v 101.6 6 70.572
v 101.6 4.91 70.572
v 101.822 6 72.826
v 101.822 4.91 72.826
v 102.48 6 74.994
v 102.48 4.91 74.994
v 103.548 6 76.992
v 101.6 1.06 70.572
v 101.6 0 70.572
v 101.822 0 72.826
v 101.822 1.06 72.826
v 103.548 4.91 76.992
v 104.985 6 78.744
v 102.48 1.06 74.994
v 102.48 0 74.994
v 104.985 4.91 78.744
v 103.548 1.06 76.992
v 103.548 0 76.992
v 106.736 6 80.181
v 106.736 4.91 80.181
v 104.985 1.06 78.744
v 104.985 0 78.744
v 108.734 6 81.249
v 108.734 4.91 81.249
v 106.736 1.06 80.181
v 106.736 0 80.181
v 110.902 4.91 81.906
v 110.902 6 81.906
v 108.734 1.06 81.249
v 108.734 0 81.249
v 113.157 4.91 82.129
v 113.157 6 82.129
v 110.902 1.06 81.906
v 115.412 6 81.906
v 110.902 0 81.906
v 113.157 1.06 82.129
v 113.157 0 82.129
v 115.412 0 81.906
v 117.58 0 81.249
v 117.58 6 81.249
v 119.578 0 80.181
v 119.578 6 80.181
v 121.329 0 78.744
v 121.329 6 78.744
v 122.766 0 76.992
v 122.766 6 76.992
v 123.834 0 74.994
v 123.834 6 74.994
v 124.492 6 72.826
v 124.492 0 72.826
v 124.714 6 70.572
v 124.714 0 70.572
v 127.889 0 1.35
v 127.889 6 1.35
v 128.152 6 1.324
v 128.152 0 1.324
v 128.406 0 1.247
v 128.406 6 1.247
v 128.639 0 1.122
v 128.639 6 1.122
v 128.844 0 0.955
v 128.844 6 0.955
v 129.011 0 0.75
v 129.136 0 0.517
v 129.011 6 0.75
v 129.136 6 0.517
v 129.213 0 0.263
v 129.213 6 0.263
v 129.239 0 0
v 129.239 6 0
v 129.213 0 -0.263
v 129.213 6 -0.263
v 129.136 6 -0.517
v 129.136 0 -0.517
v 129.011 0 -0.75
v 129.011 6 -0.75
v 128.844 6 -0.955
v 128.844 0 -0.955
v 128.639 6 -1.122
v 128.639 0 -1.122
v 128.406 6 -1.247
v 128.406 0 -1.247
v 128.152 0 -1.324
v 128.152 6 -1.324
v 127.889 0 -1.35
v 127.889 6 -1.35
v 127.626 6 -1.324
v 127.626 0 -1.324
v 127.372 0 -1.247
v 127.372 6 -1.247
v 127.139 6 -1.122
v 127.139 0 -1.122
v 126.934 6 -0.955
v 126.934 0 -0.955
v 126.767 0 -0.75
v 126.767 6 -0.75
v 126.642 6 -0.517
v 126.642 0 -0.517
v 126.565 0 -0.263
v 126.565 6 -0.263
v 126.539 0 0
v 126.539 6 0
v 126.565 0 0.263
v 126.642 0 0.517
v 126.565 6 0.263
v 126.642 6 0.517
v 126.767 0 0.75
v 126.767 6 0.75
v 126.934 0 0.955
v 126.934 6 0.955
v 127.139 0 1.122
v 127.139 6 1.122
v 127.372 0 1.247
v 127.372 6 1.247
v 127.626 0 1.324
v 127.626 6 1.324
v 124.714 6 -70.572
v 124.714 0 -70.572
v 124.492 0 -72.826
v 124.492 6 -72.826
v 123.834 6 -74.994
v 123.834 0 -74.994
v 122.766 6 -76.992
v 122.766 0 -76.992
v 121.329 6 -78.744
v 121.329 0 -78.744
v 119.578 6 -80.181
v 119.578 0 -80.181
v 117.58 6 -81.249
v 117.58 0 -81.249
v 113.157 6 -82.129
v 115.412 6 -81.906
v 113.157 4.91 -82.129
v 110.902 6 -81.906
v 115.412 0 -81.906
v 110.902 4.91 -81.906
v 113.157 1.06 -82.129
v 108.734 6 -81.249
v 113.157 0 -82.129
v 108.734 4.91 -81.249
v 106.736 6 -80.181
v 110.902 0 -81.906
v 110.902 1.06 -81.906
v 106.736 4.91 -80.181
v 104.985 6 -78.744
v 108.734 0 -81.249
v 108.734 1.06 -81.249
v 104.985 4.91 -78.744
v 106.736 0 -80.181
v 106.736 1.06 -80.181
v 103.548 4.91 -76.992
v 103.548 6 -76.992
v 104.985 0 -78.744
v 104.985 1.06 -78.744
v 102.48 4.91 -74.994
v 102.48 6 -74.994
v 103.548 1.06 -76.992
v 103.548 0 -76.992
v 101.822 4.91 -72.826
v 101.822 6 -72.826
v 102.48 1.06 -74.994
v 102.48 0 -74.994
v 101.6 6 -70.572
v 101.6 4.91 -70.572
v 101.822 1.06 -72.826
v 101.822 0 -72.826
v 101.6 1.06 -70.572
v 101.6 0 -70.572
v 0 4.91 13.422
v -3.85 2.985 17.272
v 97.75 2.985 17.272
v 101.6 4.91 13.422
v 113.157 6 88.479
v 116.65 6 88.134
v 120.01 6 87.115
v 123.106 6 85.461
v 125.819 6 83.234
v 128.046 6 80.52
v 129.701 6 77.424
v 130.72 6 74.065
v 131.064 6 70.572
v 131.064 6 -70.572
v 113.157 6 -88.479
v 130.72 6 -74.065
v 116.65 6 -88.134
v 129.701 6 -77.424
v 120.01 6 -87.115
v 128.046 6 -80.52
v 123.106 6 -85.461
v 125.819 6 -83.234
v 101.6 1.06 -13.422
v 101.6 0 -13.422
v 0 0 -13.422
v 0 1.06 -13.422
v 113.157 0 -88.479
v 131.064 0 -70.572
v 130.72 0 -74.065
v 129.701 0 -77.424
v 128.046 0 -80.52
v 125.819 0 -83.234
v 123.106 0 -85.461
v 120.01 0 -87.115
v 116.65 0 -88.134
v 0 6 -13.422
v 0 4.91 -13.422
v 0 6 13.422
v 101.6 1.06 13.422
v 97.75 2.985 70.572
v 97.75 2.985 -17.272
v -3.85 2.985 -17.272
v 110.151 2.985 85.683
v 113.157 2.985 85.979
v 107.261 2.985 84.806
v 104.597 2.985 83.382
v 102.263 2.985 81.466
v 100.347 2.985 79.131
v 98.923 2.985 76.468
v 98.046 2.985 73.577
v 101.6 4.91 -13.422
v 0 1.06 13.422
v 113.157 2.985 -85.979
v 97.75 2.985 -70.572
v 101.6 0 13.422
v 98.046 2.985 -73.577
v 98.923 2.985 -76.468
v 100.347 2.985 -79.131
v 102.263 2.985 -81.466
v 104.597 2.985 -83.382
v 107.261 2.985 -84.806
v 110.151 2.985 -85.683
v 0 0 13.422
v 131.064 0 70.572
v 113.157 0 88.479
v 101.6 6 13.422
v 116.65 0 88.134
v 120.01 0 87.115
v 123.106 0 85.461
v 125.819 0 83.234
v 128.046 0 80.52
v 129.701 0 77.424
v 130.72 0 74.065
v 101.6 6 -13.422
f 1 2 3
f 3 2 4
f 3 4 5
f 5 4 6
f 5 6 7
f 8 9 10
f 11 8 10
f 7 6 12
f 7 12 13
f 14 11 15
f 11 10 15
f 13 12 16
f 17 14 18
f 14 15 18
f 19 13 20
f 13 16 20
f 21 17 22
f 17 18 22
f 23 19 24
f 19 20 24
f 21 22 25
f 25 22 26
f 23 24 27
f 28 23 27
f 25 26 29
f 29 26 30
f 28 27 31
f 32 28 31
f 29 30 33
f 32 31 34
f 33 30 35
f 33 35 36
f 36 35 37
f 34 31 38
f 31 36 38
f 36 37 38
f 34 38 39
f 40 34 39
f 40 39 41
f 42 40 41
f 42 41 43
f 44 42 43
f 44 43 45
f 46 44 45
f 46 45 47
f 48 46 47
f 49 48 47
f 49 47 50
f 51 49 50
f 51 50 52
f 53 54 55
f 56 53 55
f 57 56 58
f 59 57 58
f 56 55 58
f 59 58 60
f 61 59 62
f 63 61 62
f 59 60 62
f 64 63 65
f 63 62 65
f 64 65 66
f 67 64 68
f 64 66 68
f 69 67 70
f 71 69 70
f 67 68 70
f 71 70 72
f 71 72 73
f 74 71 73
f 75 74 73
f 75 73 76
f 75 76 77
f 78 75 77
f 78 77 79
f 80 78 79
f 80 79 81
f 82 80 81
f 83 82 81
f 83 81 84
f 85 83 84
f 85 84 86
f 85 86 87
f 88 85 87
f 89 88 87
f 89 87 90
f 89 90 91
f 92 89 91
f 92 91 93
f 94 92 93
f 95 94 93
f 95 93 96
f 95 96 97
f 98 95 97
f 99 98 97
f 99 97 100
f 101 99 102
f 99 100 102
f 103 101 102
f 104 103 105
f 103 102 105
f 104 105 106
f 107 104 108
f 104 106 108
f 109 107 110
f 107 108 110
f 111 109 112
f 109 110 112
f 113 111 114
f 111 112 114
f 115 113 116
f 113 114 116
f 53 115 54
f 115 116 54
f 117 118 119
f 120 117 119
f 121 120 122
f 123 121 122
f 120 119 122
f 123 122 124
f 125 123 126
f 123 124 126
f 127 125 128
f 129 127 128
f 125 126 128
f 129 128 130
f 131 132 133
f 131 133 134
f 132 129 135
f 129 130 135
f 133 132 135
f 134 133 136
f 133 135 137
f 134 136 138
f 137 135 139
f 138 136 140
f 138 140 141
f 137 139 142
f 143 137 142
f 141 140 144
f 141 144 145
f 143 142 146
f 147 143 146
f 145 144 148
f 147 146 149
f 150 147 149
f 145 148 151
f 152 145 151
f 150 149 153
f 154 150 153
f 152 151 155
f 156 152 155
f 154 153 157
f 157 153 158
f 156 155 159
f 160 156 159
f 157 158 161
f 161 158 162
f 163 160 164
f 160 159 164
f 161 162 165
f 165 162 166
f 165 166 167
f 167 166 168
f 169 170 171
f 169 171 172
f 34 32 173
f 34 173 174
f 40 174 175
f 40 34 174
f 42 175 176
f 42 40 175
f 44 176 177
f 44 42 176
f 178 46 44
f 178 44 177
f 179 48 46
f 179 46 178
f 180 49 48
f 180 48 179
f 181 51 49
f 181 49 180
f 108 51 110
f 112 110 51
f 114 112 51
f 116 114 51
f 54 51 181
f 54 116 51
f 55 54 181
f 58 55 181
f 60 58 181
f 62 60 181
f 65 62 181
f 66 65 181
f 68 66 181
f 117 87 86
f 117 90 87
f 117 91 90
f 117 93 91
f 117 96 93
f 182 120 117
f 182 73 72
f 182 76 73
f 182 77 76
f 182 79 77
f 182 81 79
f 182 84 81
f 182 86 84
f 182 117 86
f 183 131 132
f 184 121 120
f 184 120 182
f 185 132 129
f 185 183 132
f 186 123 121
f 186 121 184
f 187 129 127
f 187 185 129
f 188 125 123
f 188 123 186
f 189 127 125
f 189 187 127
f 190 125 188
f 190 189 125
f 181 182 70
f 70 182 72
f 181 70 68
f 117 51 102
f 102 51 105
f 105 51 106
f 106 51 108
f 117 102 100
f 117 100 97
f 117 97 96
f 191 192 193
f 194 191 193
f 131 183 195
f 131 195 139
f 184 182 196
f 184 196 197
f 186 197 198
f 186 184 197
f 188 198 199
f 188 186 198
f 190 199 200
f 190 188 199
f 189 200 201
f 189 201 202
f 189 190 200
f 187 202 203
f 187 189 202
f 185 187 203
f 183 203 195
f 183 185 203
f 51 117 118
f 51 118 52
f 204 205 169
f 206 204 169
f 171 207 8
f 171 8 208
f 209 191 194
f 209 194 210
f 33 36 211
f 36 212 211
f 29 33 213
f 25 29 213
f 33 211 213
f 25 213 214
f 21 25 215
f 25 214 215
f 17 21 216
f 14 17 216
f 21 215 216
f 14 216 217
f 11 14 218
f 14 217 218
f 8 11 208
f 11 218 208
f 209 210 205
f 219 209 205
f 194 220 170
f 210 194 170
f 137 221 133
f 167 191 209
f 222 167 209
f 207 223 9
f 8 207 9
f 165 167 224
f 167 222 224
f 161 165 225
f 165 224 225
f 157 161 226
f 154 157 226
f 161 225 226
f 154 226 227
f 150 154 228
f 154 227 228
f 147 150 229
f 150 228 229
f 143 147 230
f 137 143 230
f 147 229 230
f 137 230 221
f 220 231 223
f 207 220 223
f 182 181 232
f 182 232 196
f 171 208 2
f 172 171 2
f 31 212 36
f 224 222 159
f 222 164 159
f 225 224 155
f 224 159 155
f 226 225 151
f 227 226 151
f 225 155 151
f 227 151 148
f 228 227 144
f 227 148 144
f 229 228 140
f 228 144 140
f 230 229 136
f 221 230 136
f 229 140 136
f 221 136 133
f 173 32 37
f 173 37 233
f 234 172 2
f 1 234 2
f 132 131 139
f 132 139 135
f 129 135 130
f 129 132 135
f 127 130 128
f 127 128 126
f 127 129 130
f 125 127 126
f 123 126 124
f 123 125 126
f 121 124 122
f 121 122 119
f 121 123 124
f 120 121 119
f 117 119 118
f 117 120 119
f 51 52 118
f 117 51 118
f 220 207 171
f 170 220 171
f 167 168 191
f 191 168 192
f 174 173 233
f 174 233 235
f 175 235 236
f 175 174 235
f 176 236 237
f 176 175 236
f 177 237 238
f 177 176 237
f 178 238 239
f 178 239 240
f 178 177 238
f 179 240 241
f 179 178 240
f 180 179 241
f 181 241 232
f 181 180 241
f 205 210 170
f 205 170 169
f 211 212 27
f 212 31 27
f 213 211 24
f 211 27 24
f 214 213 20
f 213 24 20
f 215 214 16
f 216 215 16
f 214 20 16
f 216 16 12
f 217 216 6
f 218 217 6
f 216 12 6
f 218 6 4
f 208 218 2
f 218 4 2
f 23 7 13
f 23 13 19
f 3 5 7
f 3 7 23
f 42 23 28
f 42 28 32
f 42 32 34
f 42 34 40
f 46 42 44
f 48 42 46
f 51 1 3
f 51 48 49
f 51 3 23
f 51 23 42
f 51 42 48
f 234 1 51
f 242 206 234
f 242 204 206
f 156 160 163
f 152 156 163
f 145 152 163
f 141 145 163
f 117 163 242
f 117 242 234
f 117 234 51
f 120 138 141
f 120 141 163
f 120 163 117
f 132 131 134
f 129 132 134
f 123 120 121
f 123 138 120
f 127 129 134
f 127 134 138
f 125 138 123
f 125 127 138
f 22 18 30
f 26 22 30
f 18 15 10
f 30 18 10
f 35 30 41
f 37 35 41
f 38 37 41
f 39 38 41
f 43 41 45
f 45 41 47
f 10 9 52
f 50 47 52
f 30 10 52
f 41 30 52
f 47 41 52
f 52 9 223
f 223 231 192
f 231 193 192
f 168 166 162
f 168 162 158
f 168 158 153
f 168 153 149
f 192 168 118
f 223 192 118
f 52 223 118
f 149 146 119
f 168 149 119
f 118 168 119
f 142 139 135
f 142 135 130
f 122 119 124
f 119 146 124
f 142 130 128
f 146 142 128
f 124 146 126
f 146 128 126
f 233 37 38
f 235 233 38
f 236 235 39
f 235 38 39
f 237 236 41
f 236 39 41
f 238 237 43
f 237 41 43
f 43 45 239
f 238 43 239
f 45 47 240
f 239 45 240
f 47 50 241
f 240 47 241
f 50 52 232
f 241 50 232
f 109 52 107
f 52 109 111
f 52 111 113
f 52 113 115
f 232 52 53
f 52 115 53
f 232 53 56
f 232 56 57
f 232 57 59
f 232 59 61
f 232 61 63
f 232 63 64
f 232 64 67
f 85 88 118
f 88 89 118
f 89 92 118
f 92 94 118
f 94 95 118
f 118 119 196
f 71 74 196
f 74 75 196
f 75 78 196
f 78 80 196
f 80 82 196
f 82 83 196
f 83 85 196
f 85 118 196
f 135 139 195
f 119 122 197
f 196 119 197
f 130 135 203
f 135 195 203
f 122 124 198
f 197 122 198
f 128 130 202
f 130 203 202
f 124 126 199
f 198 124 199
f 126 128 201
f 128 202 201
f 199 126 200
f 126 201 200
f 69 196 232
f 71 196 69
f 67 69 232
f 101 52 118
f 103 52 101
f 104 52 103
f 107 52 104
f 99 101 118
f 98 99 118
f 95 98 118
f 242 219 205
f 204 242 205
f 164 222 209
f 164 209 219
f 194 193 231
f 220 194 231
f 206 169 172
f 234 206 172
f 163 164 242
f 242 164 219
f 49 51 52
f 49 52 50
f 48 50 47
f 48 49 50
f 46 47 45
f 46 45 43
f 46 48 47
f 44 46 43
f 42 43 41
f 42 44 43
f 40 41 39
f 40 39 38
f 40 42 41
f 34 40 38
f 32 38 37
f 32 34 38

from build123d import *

# Parameters (mm, degrees)
BOSS_EXTRUDE1_DEPTH = 6
BOSS_EXTRUDE2_DEPTH = 6
SKETCH6_R           = 1.35
CUT_EXTRUDE1_DEPTH  = 17.78


with BuildPart() as part:
    # Sketch1 → Boss-Extrude1 (new body)
    with BuildSketch(Plane(origin=(0, 0, 0), x_dir=(1, 0, 0), z_dir=(0, 1, 0))):
        with BuildLine():
            Line((0, -13.421553628), (101.6, -13.421553628))
            Line((101.6, -13.421553628), (101.6, -70.571553628))
            ThreePointArc((101.6, -70.571553628), (113.157, -82.128553628), (124.714, -70.571553628))
            Line((124.714, -70.571553628), (124.714, 70.571553628))
            ThreePointArc((124.714, 70.571553628), (113.157, 82.128553628), (101.6, 70.571553628))
            Line((101.6, 70.571553628), (101.6, 13.421553628))
            Line((101.6, 13.421553628), (0, 13.421553628))
            Line((0, 13.421553628), (0, -13.421553628))
        make_face()
    extrude(amount=BOSS_EXTRUDE1_DEPTH)

    # Sweep1: sweep along a curve in space
    with BuildLine() as sweep1_path:
        ThreePointArc((113.157, 3, 82.128553628), (104.98496693, 3, 78.743586698), (101.6, 3, 70.571553628))
        Line((101.6, 3, 70.571553628), (101.6, 3, 13.421553628))
        Line((101.6, 3, 13.421553628), (0, 3, 13.421553628))
        Line((0, 3, 13.421553628), (0, 3, -13.421553628))
        Line((0, 3, -13.421553628), (101.6, 3, -13.421553628))
        Line((101.6, 3, -13.421553628), (101.6, 3, -70.571553628))
        ThreePointArc((101.6, 3, -70.571553628), (104.98496693, 3, -78.743586698), (113.157, 3, -82.128553628))
    # Sketch4 → Sweep1 (sweep)
    with BuildSketch(Plane(origin=(113.157, 0, 0), x_dir=(0, 0, -1), z_dir=(1, 0, 0))):
        Polygon((82.128553628, 4.910343042), (82.128553628, 1.060343042), (85.978553628, 2.985343042), align=None)
    sweep(path=sweep1_path.line, transition=Transition.RIGHT)


with BuildPart() as body_2:
    # Sketch5 → Boss-Extrude2 (new body)
    with BuildSketch(Plane(origin=(0, 6, 0), x_dir=(1, 0, 0), z_dir=(0, 1, 0))):
        with BuildLine():
            Line((131.064, -70.571553628), (131.064, 70.571553628))
            ThreePointArc((131.064, 70.571553628), (125.819161131, 83.233714759), (113.157, 88.478553628))
            Line((113.157, 88.478553628), (113.157, 82.128553628))
            ThreePointArc((113.157, 82.128553628), (121.32903307, 78.743586698), (124.714, 70.571553628))
            Line((124.714, 70.571553628), (124.714, -70.571553628))
            ThreePointArc((124.714, -70.571553628), (121.32903307, -78.743586698), (113.157, -82.128553628))
            Line((113.157, -82.128553628), (113.157, -88.478553628))
            ThreePointArc((113.157, -88.478553628), (125.819161131, -83.233714759), (131.064, -70.571553628))
        make_face()
    extrude(amount=-BOSS_EXTRUDE2_DEPTH)

    # Sketch6 → Cut-Extrude1 (cut)
    with BuildSketch(Plane(origin=(0, 6, 0), x_dir=(1, 0, 0), z_dir=(0, 1, 0))):
        with Locations(Location((127.889, 0, 0), (0, 0, 270))):
            Circle(SKETCH6_R)
    extrude(amount=-CUT_EXTRUDE1_DEPTH, mode=Mode.SUBTRACT)


solid = Compound([part.part, body_2.part])
